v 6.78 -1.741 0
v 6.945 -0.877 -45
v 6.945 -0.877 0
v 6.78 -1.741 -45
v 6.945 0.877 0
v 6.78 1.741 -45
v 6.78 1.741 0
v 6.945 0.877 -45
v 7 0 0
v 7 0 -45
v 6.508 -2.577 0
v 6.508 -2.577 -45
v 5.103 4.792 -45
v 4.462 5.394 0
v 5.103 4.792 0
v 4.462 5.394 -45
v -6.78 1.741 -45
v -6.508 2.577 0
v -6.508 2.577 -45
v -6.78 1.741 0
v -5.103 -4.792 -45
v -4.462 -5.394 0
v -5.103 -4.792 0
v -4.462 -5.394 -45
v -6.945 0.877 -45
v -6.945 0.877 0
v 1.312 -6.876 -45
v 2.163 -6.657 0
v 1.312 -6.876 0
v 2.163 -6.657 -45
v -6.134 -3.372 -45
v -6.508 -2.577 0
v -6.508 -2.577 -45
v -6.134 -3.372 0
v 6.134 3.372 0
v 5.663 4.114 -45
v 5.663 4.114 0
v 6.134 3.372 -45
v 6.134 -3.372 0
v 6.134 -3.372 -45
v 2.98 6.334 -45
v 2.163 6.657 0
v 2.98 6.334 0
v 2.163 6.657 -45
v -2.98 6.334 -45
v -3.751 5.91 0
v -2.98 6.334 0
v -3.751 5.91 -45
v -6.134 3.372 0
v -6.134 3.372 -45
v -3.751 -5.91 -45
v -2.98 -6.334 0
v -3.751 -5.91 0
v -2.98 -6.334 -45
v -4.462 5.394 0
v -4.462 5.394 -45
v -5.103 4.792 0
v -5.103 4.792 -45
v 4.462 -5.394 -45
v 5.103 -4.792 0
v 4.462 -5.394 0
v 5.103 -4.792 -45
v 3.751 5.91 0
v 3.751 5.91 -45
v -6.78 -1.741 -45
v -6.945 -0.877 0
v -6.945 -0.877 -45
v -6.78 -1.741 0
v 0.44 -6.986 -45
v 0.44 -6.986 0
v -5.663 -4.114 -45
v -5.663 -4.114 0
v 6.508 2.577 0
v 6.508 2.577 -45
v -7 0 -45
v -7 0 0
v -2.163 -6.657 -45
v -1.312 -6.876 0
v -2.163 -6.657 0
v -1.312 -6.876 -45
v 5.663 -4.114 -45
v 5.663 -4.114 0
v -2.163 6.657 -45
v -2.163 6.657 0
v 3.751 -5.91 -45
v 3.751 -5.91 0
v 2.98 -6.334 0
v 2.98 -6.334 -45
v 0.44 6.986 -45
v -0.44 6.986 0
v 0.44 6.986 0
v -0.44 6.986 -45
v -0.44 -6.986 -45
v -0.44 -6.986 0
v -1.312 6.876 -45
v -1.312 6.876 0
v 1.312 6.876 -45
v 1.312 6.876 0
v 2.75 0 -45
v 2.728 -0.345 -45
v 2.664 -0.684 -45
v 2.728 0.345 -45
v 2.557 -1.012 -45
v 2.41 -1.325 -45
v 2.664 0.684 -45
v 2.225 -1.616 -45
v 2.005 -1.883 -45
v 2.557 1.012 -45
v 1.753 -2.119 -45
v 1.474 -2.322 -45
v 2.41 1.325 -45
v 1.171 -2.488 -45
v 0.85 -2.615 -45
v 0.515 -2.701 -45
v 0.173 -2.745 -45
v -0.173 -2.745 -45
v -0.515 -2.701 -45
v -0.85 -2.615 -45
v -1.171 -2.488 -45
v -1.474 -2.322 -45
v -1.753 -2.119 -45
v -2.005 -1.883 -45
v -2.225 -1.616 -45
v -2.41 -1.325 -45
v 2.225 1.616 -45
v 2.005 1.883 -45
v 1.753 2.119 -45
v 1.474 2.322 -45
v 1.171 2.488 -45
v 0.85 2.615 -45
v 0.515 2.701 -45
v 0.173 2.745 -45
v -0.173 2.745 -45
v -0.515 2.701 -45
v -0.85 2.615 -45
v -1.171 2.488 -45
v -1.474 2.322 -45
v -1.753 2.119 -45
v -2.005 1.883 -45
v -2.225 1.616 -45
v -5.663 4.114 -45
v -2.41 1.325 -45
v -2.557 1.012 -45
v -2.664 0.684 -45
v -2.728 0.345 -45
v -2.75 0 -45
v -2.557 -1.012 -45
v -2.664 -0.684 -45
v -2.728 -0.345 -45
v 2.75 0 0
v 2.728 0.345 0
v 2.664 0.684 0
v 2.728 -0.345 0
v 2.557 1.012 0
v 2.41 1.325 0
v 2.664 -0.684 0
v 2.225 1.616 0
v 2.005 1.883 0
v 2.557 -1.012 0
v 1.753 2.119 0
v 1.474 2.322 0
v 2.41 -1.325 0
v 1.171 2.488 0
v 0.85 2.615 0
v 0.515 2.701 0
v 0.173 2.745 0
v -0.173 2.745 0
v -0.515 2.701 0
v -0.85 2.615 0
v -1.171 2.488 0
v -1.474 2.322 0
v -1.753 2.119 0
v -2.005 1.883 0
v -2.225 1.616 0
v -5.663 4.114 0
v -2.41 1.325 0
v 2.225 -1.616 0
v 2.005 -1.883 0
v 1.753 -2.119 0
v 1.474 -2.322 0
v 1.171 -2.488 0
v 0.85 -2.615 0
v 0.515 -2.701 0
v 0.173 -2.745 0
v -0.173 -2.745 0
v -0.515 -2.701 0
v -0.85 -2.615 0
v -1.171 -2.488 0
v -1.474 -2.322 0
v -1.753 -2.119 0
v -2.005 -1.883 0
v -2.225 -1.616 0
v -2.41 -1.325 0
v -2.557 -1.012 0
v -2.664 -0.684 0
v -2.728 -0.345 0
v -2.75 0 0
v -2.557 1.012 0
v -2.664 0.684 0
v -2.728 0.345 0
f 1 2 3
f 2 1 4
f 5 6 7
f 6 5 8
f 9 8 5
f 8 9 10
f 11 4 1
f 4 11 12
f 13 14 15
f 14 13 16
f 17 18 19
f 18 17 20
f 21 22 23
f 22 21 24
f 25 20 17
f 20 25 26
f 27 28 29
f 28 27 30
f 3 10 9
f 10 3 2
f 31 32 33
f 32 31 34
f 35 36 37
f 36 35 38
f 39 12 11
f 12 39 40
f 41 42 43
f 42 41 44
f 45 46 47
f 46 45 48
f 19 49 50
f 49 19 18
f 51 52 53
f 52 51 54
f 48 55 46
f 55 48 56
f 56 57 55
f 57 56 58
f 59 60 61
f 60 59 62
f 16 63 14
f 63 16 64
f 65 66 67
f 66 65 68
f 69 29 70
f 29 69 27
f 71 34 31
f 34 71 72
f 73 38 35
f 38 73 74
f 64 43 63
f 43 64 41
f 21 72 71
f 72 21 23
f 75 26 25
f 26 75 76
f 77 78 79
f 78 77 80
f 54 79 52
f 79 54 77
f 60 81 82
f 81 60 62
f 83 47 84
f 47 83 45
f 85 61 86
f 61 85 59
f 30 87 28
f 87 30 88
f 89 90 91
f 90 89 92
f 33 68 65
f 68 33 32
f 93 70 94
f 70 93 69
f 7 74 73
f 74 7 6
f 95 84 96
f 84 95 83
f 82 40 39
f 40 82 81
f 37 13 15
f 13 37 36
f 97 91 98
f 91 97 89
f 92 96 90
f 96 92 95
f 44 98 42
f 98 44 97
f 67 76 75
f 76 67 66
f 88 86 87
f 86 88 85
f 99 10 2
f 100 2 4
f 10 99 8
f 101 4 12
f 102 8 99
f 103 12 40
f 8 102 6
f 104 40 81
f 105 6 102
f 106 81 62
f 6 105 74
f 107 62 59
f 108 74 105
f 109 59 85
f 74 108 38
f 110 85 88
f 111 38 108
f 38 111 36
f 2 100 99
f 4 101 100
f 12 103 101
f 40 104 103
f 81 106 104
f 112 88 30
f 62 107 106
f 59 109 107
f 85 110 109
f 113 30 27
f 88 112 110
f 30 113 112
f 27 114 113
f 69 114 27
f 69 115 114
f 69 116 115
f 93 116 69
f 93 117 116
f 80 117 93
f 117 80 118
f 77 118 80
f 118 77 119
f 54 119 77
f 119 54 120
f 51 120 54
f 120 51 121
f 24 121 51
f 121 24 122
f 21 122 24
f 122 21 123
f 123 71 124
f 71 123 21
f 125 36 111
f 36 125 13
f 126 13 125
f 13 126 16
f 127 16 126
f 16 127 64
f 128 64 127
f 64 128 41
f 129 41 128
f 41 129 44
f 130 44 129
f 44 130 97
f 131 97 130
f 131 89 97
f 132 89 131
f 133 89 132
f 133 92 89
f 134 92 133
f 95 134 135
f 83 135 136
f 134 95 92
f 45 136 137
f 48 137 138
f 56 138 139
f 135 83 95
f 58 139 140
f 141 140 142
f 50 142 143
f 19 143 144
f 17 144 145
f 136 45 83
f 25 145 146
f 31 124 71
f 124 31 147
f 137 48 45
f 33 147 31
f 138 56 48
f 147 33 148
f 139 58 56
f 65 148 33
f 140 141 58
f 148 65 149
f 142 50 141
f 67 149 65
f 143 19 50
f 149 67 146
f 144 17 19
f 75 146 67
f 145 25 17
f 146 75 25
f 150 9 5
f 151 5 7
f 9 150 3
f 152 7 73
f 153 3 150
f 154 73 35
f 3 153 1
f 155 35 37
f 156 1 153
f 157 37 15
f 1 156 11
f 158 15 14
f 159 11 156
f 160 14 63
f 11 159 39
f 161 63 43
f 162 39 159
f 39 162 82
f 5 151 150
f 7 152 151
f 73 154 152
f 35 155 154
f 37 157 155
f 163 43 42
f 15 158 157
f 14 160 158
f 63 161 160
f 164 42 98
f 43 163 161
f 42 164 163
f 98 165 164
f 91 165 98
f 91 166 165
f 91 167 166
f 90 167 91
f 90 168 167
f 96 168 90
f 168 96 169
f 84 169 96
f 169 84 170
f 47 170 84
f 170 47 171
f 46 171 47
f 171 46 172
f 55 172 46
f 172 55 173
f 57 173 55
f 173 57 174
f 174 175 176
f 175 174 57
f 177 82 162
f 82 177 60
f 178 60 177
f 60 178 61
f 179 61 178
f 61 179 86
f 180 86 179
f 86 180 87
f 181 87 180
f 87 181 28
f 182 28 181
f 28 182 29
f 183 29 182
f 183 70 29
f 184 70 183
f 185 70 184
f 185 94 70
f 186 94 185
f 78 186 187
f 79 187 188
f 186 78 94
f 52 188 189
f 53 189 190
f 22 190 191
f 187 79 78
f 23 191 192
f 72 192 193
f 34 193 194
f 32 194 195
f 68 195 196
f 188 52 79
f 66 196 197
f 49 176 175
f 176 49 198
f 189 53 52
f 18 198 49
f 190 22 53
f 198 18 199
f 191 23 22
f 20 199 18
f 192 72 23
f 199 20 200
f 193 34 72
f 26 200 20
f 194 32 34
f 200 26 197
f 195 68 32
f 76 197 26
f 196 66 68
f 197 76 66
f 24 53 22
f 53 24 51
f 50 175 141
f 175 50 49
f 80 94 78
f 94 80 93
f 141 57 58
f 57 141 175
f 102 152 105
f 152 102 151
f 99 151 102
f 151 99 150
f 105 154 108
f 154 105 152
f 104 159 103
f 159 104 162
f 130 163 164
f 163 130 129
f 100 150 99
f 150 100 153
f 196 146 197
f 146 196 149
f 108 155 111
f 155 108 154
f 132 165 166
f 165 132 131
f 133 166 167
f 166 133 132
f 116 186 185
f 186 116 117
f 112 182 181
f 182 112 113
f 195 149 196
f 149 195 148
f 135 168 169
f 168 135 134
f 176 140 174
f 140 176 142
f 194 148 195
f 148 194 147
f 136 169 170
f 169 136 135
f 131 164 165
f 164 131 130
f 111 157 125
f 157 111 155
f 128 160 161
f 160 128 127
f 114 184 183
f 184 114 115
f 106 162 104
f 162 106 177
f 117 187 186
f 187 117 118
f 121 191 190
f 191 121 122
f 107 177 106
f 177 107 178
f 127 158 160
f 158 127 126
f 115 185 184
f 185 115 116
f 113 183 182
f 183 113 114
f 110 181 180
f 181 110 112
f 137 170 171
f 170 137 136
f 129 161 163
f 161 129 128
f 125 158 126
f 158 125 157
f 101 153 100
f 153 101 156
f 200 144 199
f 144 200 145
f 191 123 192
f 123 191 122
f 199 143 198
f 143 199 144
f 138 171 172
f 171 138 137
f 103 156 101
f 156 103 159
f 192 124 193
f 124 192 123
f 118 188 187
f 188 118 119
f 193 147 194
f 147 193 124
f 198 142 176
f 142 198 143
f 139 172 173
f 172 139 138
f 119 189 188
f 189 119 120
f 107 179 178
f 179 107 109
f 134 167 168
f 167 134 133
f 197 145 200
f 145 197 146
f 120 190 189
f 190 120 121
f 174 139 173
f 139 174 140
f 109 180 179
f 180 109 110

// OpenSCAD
$fn = 50;


difference() {
	union() {
		translate(v = [0, 0, -45.0000000000]) {
			cylinder(h = 45, r = 7.0000000000);
		}
		cylinder(h = 0, r = 16.0000000000);
	}
	union() {
		#translate(v = [0, 0, -45]) {
			cylinder(h = 45, r = 2.7500000000);
		}
	}
}
